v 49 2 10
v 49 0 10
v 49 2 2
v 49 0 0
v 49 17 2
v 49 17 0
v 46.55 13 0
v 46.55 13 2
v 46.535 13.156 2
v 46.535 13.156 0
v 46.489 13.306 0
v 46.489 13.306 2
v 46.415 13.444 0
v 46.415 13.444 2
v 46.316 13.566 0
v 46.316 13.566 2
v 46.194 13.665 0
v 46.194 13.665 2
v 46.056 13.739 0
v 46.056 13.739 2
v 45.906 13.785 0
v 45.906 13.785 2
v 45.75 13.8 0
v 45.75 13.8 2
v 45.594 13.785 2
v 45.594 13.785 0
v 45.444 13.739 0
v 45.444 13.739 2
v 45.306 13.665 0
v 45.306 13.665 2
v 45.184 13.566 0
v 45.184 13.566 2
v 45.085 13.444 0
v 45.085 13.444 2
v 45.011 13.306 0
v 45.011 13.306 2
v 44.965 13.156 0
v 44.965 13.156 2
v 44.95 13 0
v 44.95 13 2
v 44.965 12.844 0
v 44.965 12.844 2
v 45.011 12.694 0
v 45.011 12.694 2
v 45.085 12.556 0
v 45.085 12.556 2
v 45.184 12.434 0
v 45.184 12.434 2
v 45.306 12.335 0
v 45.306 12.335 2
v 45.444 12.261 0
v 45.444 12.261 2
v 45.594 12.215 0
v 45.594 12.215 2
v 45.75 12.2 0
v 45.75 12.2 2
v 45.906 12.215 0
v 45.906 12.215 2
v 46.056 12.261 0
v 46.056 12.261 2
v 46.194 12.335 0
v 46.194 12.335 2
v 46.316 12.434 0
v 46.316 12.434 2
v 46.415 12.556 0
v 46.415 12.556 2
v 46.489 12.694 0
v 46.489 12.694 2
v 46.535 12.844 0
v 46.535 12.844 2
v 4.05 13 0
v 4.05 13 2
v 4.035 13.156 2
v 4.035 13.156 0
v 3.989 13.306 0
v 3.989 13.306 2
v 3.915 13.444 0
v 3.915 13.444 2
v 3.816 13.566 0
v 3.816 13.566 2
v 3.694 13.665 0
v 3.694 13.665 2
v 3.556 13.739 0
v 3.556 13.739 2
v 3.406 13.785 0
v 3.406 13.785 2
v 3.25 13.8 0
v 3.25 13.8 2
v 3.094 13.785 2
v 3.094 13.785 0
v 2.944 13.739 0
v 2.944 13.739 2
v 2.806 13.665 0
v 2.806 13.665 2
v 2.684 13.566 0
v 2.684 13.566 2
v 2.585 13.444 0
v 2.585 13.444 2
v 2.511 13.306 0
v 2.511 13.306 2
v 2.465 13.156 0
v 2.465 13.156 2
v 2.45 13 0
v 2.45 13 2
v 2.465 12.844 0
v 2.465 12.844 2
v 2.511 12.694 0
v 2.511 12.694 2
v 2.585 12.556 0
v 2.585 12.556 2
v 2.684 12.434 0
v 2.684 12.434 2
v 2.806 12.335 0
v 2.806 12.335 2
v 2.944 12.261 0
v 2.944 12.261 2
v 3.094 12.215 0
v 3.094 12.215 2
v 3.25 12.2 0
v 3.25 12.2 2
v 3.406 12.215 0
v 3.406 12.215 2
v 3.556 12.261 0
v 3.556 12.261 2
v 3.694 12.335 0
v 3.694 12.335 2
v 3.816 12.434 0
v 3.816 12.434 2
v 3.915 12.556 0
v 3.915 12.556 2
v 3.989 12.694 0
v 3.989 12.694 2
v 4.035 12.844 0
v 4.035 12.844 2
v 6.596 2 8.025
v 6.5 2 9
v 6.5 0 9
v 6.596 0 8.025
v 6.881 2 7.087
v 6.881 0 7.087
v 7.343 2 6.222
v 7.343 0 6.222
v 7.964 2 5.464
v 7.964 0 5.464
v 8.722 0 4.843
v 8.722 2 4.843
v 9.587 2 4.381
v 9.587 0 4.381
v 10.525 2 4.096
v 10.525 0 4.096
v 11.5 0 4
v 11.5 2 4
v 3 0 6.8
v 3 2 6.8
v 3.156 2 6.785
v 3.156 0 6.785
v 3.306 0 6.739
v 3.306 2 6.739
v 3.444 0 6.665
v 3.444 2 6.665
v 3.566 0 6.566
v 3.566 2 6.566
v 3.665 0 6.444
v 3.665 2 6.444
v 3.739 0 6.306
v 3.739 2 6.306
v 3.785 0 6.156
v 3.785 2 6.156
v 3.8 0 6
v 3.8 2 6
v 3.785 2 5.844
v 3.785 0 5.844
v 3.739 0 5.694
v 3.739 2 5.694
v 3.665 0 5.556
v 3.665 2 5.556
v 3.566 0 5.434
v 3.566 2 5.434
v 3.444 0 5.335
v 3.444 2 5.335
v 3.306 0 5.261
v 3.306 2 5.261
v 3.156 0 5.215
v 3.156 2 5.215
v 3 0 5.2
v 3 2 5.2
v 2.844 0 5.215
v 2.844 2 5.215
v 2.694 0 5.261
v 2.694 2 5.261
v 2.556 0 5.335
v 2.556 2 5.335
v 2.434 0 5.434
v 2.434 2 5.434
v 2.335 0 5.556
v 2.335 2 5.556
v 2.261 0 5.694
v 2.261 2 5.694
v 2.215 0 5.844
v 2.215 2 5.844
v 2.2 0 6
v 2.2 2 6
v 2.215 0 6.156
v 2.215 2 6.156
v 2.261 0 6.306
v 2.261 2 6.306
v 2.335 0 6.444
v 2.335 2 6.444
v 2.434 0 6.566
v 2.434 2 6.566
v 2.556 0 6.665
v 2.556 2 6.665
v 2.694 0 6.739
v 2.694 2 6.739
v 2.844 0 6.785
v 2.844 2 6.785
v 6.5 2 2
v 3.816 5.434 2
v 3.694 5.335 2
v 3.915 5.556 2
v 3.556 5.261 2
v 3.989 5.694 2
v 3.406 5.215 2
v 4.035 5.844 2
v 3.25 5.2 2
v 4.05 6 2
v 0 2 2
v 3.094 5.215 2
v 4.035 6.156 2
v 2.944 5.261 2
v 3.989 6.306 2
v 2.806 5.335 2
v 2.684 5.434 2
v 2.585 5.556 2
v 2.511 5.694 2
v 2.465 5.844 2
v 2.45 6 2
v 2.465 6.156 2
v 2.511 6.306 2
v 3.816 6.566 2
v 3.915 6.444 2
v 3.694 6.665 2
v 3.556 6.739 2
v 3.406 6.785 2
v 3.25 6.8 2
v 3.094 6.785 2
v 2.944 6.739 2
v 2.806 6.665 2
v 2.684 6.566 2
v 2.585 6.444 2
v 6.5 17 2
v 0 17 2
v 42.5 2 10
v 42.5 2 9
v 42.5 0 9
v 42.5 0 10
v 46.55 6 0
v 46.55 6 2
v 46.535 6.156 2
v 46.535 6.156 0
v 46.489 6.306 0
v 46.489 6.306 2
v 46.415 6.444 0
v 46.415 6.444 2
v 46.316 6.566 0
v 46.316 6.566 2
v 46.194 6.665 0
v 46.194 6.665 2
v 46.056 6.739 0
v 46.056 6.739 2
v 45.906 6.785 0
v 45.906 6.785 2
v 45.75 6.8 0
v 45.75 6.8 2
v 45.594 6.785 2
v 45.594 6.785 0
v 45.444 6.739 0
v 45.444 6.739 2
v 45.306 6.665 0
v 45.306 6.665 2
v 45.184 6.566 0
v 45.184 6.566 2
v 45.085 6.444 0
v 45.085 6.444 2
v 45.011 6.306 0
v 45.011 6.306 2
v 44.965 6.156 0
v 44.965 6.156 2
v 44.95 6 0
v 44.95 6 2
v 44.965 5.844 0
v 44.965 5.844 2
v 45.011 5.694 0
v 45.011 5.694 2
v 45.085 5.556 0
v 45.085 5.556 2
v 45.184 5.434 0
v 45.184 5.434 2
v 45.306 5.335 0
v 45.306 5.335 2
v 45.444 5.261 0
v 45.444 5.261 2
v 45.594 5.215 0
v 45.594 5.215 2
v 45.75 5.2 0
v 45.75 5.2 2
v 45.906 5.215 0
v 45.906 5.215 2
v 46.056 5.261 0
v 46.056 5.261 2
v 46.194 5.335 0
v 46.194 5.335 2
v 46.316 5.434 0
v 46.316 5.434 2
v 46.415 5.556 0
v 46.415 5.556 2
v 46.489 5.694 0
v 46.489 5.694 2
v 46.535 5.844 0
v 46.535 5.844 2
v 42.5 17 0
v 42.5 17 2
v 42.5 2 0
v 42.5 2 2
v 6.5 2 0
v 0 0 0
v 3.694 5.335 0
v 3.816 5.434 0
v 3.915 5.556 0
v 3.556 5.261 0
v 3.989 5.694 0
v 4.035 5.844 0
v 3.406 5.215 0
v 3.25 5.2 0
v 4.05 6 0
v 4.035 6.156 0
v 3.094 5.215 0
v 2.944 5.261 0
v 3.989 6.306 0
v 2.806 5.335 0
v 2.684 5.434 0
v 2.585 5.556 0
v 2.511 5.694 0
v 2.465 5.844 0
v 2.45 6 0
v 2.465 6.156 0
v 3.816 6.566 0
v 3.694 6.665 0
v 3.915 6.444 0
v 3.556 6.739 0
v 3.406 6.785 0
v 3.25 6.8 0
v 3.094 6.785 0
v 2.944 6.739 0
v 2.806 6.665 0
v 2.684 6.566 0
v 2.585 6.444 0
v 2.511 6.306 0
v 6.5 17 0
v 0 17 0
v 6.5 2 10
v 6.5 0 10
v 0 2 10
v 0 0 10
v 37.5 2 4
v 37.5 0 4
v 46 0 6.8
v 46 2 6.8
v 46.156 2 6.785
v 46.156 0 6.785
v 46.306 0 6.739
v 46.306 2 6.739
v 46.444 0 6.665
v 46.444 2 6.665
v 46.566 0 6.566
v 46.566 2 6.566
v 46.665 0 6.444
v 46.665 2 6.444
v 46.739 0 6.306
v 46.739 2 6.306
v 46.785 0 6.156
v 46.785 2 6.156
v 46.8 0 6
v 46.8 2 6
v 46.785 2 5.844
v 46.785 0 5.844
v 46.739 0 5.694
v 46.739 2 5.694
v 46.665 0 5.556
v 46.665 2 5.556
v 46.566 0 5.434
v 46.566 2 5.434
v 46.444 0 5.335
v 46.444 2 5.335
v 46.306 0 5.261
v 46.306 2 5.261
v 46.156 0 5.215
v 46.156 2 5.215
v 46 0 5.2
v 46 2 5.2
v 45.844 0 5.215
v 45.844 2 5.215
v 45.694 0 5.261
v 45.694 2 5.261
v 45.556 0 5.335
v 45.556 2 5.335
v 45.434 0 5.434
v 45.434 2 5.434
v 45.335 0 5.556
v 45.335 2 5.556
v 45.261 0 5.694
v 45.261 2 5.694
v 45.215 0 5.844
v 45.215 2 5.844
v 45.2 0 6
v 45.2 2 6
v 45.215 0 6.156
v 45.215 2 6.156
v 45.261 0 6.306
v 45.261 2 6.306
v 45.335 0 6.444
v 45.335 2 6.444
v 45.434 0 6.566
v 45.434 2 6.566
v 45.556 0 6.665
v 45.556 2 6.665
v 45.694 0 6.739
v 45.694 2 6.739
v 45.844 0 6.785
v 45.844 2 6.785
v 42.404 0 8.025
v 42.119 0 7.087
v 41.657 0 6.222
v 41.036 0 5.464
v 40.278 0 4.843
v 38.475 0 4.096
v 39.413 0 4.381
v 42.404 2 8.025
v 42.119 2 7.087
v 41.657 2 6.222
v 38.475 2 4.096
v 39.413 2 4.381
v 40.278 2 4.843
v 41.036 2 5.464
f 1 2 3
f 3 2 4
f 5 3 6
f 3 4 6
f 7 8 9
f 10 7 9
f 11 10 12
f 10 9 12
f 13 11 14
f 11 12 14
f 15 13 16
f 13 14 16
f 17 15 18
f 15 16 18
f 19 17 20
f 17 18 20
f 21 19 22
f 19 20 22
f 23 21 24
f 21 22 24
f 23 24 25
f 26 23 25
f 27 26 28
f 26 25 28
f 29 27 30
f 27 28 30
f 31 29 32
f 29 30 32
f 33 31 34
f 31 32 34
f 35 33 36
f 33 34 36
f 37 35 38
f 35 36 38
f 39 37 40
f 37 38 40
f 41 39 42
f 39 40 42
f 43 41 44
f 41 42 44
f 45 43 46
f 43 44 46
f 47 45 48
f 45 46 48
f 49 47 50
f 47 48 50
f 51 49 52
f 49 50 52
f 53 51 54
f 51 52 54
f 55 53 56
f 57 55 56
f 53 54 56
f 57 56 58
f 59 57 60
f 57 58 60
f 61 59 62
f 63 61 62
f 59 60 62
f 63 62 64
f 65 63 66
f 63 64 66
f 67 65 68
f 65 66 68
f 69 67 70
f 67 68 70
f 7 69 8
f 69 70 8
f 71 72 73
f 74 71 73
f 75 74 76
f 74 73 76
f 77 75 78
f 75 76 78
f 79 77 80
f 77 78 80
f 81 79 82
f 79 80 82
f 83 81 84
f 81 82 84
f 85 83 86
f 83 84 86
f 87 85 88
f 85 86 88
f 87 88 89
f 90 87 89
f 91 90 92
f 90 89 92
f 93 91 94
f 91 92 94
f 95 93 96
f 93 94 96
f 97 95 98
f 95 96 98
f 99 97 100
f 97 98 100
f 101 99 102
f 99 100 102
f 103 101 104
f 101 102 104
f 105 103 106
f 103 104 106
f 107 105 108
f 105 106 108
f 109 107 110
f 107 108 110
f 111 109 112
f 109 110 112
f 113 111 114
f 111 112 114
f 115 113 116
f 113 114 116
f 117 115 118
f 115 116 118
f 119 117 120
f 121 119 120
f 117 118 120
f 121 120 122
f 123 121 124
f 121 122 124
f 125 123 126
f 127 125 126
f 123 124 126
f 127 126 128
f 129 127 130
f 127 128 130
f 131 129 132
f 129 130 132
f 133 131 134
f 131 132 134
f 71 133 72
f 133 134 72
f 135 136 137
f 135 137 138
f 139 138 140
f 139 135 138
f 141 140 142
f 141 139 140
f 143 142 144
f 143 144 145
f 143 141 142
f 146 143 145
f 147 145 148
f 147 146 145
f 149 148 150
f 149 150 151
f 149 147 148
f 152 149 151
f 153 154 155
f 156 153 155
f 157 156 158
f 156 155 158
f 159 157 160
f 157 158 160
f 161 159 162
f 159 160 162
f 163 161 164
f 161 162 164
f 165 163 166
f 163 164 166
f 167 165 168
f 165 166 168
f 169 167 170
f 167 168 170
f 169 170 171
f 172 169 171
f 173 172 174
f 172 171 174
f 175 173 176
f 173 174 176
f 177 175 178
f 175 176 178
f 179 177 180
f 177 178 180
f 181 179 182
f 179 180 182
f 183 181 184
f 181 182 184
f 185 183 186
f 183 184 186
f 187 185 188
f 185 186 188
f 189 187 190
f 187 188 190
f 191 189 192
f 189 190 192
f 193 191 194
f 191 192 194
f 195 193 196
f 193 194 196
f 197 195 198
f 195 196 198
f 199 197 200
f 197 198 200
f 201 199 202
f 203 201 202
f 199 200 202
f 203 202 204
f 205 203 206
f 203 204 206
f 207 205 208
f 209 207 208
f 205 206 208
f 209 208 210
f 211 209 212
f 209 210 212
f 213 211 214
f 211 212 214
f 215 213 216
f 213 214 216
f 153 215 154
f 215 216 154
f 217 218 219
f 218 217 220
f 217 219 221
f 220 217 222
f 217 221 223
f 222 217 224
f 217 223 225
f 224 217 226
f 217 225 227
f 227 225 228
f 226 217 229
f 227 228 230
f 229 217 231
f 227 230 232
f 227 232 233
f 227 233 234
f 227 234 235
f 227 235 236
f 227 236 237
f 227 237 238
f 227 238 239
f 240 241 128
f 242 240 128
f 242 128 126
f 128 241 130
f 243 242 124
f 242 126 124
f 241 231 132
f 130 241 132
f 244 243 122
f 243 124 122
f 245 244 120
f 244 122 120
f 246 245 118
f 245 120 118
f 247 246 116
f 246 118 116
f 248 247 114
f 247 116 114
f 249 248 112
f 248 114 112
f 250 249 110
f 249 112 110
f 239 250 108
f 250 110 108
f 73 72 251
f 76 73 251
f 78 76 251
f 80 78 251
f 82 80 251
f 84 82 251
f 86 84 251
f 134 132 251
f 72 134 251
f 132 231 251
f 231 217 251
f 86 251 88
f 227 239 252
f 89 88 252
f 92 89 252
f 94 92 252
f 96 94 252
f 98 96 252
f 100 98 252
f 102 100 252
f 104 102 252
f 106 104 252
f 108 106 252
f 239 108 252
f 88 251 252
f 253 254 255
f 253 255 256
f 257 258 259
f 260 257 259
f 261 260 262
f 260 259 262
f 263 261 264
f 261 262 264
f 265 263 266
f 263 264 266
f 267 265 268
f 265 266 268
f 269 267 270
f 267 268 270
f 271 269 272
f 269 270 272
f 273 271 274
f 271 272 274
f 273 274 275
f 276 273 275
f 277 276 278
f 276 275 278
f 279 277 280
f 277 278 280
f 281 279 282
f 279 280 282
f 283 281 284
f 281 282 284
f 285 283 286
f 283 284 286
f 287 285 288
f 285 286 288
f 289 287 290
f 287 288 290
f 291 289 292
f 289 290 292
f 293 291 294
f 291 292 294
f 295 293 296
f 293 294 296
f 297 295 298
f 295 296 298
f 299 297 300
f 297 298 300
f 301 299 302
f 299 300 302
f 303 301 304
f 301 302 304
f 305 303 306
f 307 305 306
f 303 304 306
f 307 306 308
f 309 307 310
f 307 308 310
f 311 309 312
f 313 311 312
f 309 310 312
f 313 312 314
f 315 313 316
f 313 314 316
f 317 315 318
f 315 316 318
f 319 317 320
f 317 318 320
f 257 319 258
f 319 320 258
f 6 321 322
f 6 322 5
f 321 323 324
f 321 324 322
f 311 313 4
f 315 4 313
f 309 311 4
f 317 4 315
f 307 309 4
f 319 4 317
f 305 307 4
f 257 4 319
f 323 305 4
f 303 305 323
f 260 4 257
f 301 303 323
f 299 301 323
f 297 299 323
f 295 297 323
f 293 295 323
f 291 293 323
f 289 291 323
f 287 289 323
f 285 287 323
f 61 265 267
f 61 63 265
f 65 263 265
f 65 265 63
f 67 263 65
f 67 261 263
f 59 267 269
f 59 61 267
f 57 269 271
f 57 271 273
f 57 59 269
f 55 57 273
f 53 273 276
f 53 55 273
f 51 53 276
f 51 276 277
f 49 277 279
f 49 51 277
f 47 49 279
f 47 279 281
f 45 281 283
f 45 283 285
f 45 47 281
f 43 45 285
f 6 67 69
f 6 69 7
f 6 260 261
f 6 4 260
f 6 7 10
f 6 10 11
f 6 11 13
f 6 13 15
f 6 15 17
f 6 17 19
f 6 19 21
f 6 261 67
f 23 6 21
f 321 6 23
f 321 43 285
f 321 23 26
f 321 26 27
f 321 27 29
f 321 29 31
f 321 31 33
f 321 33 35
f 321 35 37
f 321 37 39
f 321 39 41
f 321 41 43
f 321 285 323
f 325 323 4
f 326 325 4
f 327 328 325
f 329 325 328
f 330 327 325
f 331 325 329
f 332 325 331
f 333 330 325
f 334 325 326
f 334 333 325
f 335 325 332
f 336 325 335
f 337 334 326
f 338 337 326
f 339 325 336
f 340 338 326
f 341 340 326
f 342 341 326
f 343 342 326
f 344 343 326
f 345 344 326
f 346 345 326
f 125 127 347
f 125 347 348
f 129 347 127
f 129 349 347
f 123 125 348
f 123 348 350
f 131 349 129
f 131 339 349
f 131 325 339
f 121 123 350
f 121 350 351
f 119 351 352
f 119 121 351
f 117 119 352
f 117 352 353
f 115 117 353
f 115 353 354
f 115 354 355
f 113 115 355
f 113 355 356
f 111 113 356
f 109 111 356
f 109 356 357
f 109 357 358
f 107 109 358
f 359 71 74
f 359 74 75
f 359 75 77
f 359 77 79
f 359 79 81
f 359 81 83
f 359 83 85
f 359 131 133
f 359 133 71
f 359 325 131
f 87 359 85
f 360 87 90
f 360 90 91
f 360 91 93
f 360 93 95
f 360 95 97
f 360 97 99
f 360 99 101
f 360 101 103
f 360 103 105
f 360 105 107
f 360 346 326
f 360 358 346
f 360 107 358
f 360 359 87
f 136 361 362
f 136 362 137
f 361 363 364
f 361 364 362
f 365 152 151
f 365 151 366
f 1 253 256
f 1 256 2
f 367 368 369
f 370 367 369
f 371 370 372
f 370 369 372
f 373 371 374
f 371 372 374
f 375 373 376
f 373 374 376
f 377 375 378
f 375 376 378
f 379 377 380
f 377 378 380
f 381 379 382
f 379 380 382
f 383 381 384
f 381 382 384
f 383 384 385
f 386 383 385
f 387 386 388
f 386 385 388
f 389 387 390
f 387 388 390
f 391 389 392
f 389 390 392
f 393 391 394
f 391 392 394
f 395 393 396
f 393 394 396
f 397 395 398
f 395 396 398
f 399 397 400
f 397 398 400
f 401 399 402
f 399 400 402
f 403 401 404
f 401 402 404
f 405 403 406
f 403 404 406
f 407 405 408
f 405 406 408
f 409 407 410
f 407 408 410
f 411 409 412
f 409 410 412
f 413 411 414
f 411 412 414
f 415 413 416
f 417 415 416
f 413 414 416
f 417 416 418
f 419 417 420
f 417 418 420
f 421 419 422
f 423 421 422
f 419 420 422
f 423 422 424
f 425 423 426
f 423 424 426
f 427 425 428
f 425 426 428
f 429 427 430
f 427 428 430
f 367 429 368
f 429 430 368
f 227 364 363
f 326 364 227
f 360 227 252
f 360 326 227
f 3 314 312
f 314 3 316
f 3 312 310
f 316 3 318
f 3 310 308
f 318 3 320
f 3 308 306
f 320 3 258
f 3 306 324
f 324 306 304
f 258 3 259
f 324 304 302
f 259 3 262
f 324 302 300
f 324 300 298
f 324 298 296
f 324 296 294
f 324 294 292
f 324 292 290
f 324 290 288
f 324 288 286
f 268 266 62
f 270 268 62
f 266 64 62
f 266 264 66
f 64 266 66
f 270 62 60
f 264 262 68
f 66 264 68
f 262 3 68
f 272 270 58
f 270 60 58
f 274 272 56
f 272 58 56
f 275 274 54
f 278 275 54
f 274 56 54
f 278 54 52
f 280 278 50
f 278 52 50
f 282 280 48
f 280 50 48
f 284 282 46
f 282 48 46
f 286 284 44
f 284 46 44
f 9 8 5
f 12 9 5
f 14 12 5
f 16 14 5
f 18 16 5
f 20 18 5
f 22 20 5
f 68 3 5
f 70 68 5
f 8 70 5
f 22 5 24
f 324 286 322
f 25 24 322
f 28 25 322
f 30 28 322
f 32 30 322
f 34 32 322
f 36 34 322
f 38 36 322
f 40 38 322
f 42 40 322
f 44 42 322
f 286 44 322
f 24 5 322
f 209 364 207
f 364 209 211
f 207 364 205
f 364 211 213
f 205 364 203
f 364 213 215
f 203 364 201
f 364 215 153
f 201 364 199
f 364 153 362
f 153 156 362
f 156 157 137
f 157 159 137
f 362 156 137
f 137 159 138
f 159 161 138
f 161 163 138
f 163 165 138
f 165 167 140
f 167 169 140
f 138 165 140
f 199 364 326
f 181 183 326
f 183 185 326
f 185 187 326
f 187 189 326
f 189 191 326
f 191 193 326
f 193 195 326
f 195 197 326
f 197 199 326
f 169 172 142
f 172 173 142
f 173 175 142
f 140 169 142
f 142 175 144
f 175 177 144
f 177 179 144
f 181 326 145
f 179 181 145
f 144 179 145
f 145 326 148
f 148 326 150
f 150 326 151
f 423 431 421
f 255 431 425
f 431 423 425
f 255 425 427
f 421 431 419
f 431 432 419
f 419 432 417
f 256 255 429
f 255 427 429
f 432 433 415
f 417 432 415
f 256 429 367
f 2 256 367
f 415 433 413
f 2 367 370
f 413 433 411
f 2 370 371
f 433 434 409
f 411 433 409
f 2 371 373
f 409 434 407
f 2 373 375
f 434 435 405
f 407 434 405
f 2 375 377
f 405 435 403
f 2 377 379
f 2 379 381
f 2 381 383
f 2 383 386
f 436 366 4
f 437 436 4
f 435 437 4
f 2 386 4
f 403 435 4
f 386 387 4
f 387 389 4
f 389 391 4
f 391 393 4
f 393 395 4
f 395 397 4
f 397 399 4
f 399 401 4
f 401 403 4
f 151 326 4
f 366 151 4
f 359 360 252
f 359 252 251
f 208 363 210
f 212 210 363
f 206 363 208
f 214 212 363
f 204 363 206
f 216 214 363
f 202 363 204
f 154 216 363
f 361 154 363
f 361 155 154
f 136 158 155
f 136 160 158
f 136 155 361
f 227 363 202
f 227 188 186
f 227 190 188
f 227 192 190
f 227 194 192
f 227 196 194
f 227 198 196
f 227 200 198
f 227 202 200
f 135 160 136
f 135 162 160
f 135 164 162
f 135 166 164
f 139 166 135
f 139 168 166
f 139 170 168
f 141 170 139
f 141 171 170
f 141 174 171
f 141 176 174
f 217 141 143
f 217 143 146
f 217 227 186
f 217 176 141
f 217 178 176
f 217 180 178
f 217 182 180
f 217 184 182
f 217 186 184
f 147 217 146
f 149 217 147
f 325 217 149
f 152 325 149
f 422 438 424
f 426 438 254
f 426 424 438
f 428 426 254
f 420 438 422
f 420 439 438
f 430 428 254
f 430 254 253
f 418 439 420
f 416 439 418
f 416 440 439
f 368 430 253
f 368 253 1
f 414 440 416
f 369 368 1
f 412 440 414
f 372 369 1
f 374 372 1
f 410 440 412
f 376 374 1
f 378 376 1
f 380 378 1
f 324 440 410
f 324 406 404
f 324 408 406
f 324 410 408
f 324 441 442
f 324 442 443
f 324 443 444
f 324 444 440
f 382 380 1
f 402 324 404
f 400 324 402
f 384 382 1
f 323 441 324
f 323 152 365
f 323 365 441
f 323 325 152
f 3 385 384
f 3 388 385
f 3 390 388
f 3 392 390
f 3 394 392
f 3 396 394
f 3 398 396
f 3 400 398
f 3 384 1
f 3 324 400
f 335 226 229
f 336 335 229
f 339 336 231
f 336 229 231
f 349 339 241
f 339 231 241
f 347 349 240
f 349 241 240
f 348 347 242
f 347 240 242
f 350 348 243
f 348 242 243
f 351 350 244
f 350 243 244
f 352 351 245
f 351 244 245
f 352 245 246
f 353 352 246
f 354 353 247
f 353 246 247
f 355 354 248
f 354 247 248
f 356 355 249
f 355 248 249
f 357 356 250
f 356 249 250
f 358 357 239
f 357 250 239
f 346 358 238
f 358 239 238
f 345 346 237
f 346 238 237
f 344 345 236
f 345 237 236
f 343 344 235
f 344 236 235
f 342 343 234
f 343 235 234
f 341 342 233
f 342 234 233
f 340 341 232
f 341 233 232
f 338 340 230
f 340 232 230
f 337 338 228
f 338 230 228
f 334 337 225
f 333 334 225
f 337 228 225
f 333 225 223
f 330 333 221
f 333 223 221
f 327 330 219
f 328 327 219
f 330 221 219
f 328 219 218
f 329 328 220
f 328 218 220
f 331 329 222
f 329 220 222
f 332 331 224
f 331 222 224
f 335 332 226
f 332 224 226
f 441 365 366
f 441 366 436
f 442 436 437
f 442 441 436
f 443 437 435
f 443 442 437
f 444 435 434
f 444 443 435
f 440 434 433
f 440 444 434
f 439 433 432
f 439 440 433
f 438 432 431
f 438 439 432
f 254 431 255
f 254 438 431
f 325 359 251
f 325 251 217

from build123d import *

# Parameters (mm, degrees)
BOSS_EXTRUDE1_DEPTH = 2
SKETCH2_W           = 49
SKETCH2_H           = 2
BOSS_EXTRUDE2_DEPTH = 8
SKETCH3_R           = 0.8
CUT_EXTRUDE1_DEPTH  = 2
SKETCH4_R           = 0.8
CUT_EXTRUDE2_DEPTH  = 2
CUT_EXTRUDE3_DEPTH  = 2


with BuildPart() as part:
    # Sketch1 → Boss-Extrude1 (new body)
    with BuildSketch(Plane.XY):
        Polygon((42.5, 17), (49, 17), (49, 0), (0, 0), (0, 17), (6.5, 17), (6.5, 2), (42.5, 2), align=None)
    extrude(amount=BOSS_EXTRUDE1_DEPTH)

    # Sketch2 → Boss-Extrude2 (add)
    with BuildSketch(Plane.XY.offset(2)):
        with Locations((24.5, 1)):
            Rectangle(SKETCH2_W, SKETCH2_H)
    extrude(amount=BOSS_EXTRUDE2_DEPTH)

    # Sketch3 → Cut-Extrude1 (cut)
    with BuildSketch(Plane.XY.offset(2)):
        with Locations((3.25, 13)):
            Circle(SKETCH3_R)
        with Locations((3.25, 6)):
            Circle(SKETCH3_R)
        with Locations((45.75, 13)):
            Circle(SKETCH3_R)
        with Locations((45.75, 6)):
            Circle(SKETCH3_R)
    extrude(amount=-CUT_EXTRUDE1_DEPTH, mode=Mode.SUBTRACT)

    # Sketch4 → Cut-Extrude2 (cut)
    with BuildSketch(Plane(origin=(0, 2, 0), x_dir=(1, 0, 0), z_dir=(0, 1, 0))):
        with Locations((3, -6)):
            Circle(SKETCH4_R)
        with Locations((46, -6)):
            Circle(SKETCH4_R)
    extrude(amount=-CUT_EXTRUDE2_DEPTH, mode=Mode.SUBTRACT)

    # Sketch5 → Cut-Extrude3 (cut)
    with BuildSketch(Plane(origin=(0, 2, 0), x_dir=(1, 0, 0), z_dir=(0, 1, 0))):
        with BuildLine():
            Line((6.5, -10), (6.5, -9))
            ThreePointArc((6.5, -9), (7.964466094, -5.464466094), (11.5, -4))
            Line((11.5, -4), (37.5, -4))
            ThreePointArc((37.5, -4), (41.035533906, -5.464466094), (42.5, -9))
            Line((42.5, -9), (42.5, -10))
            Line((42.5, -10), (6.5, -10))
        make_face()
    extrude(amount=-CUT_EXTRUDE3_DEPTH, mode=Mode.SUBTRACT)


solid = part.part
